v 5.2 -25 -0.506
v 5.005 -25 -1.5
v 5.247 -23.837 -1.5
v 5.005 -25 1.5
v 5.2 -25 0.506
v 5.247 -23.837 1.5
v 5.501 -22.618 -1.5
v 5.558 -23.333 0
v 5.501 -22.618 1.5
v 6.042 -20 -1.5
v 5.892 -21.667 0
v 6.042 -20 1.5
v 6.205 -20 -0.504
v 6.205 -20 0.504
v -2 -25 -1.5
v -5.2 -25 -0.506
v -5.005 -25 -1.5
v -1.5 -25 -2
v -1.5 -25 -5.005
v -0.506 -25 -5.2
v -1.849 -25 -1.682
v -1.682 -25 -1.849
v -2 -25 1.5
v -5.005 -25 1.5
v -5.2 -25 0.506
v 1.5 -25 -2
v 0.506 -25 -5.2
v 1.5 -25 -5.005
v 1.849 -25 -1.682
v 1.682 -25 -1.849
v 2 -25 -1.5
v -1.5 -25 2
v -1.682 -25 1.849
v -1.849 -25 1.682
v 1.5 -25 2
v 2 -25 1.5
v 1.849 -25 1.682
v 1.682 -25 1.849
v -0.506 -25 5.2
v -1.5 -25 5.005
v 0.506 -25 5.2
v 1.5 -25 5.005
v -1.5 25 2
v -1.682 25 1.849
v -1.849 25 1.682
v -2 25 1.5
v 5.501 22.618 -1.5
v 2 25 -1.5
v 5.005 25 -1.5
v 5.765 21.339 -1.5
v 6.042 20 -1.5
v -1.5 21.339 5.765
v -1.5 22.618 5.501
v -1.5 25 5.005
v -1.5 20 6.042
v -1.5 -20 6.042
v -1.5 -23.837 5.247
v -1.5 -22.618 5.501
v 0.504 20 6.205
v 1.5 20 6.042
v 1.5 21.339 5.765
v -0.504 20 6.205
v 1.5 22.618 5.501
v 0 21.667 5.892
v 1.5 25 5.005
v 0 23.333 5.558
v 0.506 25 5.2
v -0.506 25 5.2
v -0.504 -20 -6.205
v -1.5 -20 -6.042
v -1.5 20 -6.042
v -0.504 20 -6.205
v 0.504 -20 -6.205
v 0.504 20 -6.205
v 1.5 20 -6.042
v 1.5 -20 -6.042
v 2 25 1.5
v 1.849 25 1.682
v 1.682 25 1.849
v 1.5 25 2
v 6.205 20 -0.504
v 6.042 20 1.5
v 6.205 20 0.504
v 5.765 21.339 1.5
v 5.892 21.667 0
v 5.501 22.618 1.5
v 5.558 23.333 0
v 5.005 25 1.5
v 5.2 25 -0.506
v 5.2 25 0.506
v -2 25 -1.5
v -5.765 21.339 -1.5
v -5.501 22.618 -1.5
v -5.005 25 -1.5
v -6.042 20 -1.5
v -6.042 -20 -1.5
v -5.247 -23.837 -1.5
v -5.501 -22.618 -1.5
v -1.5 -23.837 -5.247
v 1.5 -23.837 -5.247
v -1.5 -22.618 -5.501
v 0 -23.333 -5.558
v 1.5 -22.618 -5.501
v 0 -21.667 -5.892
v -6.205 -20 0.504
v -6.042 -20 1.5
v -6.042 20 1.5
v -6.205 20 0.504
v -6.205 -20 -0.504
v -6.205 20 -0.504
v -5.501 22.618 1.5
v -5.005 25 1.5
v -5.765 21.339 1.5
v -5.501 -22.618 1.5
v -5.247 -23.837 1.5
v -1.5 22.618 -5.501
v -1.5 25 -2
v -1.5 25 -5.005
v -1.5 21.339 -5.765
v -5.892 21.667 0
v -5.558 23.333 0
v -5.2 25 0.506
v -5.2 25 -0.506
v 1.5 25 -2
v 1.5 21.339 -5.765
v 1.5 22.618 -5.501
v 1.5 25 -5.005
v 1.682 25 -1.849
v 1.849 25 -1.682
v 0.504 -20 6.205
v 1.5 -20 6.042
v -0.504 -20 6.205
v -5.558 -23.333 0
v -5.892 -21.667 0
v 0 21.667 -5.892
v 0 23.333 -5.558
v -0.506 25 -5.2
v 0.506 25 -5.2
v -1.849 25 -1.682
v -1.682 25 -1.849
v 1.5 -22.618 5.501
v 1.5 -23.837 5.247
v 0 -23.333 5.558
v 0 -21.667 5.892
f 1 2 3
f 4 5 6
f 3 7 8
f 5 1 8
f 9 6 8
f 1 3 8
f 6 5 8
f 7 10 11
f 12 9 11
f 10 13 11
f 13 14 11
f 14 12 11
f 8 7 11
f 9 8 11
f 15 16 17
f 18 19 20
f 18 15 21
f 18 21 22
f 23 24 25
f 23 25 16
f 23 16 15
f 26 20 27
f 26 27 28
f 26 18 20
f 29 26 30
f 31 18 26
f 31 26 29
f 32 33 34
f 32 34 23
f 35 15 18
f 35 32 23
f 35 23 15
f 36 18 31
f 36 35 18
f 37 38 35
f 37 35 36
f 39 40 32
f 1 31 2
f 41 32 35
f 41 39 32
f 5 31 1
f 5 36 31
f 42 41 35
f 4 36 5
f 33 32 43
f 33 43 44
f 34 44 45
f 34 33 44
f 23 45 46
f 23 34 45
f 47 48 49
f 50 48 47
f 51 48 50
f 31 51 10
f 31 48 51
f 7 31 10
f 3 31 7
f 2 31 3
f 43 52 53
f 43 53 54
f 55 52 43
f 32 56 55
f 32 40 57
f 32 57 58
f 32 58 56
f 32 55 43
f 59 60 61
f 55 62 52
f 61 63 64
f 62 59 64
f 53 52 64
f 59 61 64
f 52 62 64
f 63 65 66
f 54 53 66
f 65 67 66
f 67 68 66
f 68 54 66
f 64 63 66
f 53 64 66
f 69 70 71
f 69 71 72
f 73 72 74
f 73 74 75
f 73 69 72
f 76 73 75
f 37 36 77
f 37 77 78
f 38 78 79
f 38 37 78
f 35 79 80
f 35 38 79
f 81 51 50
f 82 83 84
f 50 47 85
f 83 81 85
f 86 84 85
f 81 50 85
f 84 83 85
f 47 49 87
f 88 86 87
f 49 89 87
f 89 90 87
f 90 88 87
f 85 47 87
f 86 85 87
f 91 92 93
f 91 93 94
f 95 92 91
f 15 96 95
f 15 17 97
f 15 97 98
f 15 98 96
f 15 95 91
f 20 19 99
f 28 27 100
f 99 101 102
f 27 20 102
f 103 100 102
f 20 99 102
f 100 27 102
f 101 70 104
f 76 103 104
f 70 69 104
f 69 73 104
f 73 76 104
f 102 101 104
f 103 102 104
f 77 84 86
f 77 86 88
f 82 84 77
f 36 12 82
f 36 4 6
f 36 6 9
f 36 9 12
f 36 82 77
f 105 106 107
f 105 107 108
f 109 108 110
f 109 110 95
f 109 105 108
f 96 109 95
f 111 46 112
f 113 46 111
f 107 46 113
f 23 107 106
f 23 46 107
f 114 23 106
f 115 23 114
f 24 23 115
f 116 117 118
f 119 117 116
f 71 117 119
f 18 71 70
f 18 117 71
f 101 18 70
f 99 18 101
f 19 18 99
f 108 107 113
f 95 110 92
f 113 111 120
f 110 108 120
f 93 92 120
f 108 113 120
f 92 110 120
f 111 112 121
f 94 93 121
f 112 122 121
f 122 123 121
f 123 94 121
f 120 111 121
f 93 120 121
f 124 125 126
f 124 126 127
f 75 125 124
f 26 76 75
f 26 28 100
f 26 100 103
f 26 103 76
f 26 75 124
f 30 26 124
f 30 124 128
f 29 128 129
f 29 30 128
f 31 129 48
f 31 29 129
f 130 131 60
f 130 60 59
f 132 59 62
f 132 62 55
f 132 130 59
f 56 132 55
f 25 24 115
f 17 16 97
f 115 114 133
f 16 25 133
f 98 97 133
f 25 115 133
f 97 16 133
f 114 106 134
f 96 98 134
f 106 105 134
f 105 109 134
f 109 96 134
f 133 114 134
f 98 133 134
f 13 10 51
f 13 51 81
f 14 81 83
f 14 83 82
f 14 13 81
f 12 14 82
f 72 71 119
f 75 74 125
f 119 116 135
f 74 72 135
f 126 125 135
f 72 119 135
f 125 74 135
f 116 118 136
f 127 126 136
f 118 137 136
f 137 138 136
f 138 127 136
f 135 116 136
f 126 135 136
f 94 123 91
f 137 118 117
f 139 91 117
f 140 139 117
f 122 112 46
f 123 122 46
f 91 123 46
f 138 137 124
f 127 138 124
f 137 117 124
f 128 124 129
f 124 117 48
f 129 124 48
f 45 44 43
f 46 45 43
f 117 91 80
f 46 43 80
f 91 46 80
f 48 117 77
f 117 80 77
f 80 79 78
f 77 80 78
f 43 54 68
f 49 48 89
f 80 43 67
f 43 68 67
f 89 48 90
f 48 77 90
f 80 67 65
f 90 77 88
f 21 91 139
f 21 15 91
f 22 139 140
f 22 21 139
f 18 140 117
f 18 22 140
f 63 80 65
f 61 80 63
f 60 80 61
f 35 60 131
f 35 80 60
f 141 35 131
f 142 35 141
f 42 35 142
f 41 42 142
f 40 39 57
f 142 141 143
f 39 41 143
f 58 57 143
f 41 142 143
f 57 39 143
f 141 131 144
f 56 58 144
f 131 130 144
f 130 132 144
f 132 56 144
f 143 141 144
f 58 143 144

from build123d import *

# Parameters (mm, degrees)
F1_DEPTH      = 25
F1_DEPTH_BACK = 25
F2_SIZE2      = 5
F2_SIZE       = 1
F3_SIZE2      = 1
F3_SIZE       = 5
F3_2_SIZE2    = 1
F3_2_SIZE     = 5
F3_3_SIZE2    = 1
F3_3_SIZE     = 5
F3_4_SIZE2    = 1
F3_4_SIZE     = 5


with BuildPart() as f1:
    # F0 (on Front) → F1 (new body, two sides)
    with BuildSketch(Plane.XZ) as f1_sk:
        with BuildLine():
            Line((-1.5, -2), (-1.5, -6.0415747119))
            ThreePointArc((-1.5, -6.0415747119), (0, -6.225), (1.5, -6.0415747119))
            Line((1.5, -6.0415747119), (1.5, -2))
            ThreePointArc((1.5, -2), (1.767766953, -1.767766953), (2, -1.5))
            Line((2, -1.5), (6.0415747119, -1.5))
            ThreePointArc((6.0415747119, -1.5), (6.225, 0), (6.0415747119, 1.5))
            Line((6.0415747119, 1.5), (2, 1.5))
            ThreePointArc((2, 1.5), (1.767766953, 1.767766953), (1.5, 2))
            Line((1.5, 2), (1.5, 6.0415747119))
            ThreePointArc((1.5, 6.0415747119), (0, 6.225), (-1.5, 6.0415747119))
            Line((-1.5, 6.0415747119), (-1.5, 2))
            ThreePointArc((-1.5, 2), (-1.767766953, 1.767766953), (-2, 1.5))
            Line((-2, 1.5), (-6.0415747119, 1.5))
            ThreePointArc((-6.0415747119, 1.5), (-6.225, 0), (-6.0415747119, -1.5))
            Line((-6.0415747119, -1.5), (-2, -1.5))
            ThreePointArc((-2, -1.5), (-1.767766953, -1.767766953), (-1.5, -2))
        make_face()
    extrude(amount=F1_DEPTH)
    extrude(f1_sk.sketch, amount=-F1_DEPTH_BACK)

    # F2
    f2_edges = [f1.edges().sort_by_distance(p)[0] for p in [
        (0, -25, 6.225),
        (6.225, -25, 0),
        (0, -25, -6.225),
        (-6.225, -25, 0),
    ]]
    f2_side = f1.faces().sort_by_distance((0, -25, 0))[0]
    chamfer(f2_edges, length=F2_SIZE, length2=F2_SIZE2, reference=f2_side)

    # F3
    f3_edges = [f1.edges().sort_by_distance(p)[0] for p in [
        (0, 25, 6.225),
    ]]
    f3_side = f1.faces().sort_by_distance((0, 2.5, 6.225))[0]
    chamfer(f3_edges, length=F3_SIZE, length2=F3_SIZE2, reference=f3_side)

    # F3#2
    f3_2_edges = [f1.edges().sort_by_distance(p)[0] for p in [
        (6.225, 25, 0),
    ]]
    f3_2_side = f1.faces().sort_by_distance((6.225, 2.5, 0))[0]
    chamfer(f3_2_edges, length=F3_2_SIZE, length2=F3_2_SIZE2, reference=f3_2_side)

    # F3#3
    f3_3_edges = [f1.edges().sort_by_distance(p)[0] for p in [
        (-6.225, 25, 0),
    ]]
    f3_3_side = f1.faces().sort_by_distance((-6.225, 2.5, 0))[0]
    chamfer(f3_3_edges, length=F3_3_SIZE, length2=F3_3_SIZE2, reference=f3_3_side)

    # F3#4
    f3_4_edges = [f1.edges().sort_by_distance(p)[0] for p in [
        (0, 25, -6.225),
    ]]
    f3_4_side = f1.faces().sort_by_distance((0, 2.5, -6.225))[0]
    chamfer(f3_4_edges, length=F3_4_SIZE, length2=F3_4_SIZE2, reference=f3_4_side)


solid = f1.part
